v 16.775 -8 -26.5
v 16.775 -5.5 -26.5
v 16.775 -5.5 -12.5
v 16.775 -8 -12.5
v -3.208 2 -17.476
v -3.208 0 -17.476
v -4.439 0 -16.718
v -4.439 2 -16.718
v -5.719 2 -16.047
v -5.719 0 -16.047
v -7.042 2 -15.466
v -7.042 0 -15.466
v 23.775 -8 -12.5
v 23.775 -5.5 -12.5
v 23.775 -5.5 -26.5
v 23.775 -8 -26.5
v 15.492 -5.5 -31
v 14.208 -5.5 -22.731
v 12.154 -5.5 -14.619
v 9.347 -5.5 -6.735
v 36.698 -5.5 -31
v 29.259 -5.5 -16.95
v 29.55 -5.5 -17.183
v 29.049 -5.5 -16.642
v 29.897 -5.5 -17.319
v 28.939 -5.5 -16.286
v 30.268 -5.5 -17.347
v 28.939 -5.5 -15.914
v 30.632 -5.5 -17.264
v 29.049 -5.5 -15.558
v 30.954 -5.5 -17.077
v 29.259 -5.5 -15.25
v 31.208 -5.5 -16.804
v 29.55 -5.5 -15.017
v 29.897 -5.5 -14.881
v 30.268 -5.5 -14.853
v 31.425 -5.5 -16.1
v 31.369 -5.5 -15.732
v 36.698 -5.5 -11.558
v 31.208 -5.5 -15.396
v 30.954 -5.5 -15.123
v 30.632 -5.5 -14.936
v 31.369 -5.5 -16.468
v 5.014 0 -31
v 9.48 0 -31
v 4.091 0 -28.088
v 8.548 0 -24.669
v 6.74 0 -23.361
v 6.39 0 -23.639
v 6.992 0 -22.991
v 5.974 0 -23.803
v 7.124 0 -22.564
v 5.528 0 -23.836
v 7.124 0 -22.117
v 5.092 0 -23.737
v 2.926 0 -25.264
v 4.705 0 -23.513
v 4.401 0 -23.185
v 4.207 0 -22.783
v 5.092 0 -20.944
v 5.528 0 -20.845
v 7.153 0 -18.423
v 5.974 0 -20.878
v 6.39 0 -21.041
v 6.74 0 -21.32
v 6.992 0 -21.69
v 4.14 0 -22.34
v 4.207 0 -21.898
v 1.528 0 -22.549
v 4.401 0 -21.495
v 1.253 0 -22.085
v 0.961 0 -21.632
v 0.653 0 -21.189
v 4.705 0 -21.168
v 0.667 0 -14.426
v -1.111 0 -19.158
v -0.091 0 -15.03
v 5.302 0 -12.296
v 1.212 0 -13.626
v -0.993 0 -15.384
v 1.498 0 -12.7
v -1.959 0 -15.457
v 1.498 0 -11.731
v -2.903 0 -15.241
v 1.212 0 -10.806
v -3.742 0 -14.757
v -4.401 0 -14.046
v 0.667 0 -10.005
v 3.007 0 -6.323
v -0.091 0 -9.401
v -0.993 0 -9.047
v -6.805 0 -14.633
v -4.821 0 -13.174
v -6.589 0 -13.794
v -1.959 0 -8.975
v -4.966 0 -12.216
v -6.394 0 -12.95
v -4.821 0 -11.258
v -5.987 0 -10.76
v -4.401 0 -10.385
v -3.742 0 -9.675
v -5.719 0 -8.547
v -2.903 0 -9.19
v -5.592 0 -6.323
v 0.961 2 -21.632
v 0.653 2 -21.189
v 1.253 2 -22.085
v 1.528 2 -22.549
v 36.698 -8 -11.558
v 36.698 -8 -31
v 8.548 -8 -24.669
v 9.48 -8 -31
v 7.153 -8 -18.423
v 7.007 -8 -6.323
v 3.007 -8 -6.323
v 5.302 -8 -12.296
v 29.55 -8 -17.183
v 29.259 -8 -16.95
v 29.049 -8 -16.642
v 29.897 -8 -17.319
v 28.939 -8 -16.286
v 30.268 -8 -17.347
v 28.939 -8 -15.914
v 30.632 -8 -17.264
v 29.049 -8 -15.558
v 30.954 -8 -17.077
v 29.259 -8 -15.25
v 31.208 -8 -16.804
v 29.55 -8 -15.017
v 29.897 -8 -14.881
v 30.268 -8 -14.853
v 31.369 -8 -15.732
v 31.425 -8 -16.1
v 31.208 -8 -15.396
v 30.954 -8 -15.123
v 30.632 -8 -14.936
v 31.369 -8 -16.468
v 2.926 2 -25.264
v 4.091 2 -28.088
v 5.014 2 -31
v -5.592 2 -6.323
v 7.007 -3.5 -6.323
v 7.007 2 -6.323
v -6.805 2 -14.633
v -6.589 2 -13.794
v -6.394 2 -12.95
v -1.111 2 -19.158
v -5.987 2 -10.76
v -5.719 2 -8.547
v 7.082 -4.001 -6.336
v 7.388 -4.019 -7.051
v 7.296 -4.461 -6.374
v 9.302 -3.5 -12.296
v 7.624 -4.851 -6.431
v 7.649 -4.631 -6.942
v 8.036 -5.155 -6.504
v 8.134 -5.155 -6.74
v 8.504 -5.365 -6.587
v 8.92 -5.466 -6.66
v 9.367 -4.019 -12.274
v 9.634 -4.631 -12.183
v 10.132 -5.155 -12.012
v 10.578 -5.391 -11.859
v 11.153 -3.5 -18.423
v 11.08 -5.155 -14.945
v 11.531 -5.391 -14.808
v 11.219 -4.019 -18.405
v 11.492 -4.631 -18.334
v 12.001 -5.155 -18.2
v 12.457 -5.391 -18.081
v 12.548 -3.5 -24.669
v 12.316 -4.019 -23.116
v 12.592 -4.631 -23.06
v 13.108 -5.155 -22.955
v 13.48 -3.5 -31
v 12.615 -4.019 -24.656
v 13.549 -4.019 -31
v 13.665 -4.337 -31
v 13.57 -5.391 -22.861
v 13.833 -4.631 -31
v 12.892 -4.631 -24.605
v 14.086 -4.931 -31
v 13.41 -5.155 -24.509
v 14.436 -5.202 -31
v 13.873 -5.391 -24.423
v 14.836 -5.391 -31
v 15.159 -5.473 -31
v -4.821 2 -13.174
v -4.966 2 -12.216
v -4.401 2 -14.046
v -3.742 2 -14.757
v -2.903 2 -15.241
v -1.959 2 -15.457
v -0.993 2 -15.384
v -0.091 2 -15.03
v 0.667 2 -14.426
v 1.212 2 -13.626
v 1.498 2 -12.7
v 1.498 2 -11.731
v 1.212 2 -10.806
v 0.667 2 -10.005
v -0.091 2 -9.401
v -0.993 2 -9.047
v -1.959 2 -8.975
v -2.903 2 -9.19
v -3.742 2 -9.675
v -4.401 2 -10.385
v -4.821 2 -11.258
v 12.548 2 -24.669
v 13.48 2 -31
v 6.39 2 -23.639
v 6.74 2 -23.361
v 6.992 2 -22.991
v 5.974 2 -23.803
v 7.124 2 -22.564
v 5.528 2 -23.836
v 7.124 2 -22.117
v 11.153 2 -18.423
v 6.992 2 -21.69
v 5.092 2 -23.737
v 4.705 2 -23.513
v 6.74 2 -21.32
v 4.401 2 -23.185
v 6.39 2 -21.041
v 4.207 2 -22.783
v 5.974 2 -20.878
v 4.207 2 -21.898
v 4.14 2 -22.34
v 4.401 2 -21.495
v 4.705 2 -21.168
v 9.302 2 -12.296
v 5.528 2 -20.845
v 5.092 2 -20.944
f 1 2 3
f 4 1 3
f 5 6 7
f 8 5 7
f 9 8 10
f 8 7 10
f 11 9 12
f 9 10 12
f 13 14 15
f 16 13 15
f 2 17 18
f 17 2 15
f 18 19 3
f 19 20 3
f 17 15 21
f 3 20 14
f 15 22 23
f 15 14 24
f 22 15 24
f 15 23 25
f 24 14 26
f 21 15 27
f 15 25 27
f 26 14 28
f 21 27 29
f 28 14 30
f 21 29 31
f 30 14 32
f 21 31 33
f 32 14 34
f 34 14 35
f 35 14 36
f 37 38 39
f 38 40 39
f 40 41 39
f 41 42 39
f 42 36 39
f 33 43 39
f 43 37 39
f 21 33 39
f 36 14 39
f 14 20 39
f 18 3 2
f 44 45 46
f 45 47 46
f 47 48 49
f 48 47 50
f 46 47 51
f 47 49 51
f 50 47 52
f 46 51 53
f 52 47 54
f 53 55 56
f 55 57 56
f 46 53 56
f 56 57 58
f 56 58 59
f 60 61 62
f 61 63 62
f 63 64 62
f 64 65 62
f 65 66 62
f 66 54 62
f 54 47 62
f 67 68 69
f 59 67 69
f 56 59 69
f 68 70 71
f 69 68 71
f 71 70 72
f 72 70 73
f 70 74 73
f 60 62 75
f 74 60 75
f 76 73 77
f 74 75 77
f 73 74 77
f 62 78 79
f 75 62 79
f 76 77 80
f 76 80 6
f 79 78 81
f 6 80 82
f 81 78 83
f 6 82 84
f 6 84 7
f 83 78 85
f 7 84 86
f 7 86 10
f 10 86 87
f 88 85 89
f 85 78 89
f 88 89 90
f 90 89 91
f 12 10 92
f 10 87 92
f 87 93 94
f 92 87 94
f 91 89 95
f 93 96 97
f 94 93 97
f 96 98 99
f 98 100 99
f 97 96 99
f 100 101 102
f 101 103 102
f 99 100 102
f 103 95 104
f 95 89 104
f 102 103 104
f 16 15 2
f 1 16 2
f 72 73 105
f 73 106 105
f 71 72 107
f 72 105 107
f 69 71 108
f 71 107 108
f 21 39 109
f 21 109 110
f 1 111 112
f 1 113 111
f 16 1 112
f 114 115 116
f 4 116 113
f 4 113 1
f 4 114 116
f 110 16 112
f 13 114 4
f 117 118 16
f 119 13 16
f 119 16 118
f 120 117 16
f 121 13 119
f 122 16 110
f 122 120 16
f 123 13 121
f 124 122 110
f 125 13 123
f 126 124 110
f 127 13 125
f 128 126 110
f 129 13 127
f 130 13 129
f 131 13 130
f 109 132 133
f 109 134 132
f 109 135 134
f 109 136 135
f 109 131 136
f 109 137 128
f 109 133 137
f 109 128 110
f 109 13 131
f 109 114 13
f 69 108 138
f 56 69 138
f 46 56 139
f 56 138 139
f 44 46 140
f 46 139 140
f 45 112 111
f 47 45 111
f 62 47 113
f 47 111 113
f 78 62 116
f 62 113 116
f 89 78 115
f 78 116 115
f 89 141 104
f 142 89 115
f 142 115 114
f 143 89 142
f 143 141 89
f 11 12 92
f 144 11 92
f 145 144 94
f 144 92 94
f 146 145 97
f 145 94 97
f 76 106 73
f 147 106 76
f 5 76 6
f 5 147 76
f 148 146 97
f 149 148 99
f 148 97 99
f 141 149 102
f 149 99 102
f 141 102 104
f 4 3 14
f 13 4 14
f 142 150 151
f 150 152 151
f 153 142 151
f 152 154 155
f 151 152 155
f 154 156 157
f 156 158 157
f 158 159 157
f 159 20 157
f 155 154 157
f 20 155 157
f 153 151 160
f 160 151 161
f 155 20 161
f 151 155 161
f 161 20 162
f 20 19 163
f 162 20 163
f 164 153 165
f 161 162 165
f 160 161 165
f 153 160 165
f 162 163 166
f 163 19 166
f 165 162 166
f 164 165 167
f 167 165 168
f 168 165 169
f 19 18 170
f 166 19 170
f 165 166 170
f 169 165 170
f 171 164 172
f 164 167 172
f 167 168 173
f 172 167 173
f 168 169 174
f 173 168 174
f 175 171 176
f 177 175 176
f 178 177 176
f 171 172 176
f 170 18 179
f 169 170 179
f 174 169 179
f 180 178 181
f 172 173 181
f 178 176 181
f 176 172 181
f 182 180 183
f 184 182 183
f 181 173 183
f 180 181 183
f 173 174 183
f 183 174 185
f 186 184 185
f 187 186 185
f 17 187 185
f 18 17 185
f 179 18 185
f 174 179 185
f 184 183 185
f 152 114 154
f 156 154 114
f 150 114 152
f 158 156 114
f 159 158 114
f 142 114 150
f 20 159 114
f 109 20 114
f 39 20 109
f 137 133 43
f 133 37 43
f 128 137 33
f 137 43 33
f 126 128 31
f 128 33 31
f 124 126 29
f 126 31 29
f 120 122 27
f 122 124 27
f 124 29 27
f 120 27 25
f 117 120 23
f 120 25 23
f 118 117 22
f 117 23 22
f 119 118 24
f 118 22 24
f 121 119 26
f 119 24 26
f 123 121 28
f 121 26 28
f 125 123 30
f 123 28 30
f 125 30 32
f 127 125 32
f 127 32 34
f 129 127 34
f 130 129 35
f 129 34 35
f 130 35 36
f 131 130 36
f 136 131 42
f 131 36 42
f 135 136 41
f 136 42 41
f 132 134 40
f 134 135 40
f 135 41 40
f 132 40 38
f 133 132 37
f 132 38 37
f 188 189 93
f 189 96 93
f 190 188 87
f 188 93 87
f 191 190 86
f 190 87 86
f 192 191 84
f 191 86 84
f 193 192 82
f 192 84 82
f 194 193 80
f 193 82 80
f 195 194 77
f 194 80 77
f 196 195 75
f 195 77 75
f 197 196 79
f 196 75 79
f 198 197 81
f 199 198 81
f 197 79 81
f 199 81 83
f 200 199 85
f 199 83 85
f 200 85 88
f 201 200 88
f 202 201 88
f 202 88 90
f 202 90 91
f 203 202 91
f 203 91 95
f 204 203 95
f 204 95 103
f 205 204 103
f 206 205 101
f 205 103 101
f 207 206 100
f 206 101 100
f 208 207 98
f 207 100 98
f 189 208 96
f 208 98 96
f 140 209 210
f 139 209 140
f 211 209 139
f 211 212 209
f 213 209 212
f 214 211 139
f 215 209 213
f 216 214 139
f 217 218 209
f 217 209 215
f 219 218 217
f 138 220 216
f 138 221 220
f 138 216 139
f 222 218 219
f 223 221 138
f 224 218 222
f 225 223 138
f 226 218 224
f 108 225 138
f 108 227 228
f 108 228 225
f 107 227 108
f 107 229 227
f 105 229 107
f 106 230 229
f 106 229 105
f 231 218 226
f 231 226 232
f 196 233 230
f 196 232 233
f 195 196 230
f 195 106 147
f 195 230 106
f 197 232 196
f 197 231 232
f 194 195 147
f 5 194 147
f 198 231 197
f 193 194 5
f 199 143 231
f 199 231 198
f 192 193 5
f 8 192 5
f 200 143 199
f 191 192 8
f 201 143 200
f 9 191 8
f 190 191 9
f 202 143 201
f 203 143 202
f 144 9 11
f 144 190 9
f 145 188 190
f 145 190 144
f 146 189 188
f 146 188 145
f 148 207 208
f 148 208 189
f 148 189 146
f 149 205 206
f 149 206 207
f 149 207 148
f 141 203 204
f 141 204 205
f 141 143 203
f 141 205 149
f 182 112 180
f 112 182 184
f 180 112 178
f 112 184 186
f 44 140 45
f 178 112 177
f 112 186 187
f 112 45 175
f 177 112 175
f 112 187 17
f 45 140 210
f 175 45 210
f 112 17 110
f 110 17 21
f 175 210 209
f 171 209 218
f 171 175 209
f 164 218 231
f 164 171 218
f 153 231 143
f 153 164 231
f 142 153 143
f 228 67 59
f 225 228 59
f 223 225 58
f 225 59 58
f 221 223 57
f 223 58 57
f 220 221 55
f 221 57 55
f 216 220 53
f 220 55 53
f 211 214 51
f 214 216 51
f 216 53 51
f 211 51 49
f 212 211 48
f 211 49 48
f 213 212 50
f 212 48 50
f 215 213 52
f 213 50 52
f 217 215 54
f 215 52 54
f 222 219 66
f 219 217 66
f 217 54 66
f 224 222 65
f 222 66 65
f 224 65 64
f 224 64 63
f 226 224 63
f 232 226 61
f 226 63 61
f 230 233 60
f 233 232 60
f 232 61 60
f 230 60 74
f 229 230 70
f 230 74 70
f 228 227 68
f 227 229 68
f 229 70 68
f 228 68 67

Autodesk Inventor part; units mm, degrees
ref_plane "YZ Plane" through (0, 0, 0) normal (1, 0, 0) x (0, 1, 0)
ref_plane "XZ Plane" through (0, 0, 0) normal (0, 1, 0) x (-1, 0, 0)
ref_plane "XY Plane" through (0, 0, 0) normal (0, 0, 1) x (1, 0, 0)
sketch "Sketch1" plane through (0, 0, 0) normal (0, 1, 0) x (-1, 0, 0)
  line L0 (0, 0) -> (60, 0)
  line L1 (60, 0) -> (60, -81)
  line L2 (60, -81) -> (0, -81)
  line L3 (0, -81) -> (0, 0)
  line L4 (45, -21.6284) -> (15, -21.6284) construction
  line L5 (45, -81) -> (45, 0) construction
  line L6 (15, 0) -> (15, -81) construction
  circle A0 centre (40, -73.5) radius 1.5
  circle A1 centre (40, -7.5) radius 1.5
  circle A2 centre (20, -7.5) radius 1.5
  circle A3 centre (20, -73.5) radius 1.5
  line L7 (60, -40.5) -> (0, -40.5) construction
  line L8 (30, 0) -> (30, -81) construction
  circle A4 centre (30, -40.5) radius 24
  circle A5 centre (30, -40.5) radius 27.5
  circle A6 centre (57.1293, -36) radius 1.5
  circle A7 centre (57.1293, -45) radius 1.5
  circle A8 centre (25.5, -13.3707) radius 1.5
  circle A9 centre (34.5, -13.3707) radius 1.5
  circle A10 centre (2.8707, -45) radius 1.5
  circle A11 centre (2.8707, -36) radius 1.5
  circle A12 centre (34.5, -67.6293) radius 1.5
  circle A13 centre (25.5, -67.6293) radius 1.5
  circle A14 centre (30, -40.5) radius 40 construction
  arc A15 (60, -81) -> (60, 0) centre (-17.0125, -40.5) ccw
  circle A16 centre (30, -40.5) radius 36.28 construction
  circle A17 centre (65.9998, -36) radius 1.5
  circle A18 centre (65.9998, -45) radius 1.5
  circle A19 centre (-5.9998, -45) radius 1.5
  circle A20 centre (-5.9998, -36) radius 1.5
  arc A21 (0, 0) -> (0, -81) centre (77.0125, -40.5) ccw
  line L9 (30, -40.5) -> (-3.3536, -73.8536) construction
  circle A22 centre (1.7157, -68.7843) radius 1.5
  circle A23 centre (11.8404, -76.1403) radius 1.5
  circle A24 centre (23.7426, -80.0075) radius 1.5
  circle A25 centre (36.2574, -80.0075) radius 1.5
  circle A26 centre (48.1596, -76.1403) radius 1.5
  circle A27 centre (58.2843, -68.7843) radius 1.5
  circle A28 centre (65.6403, -58.6596) radius 1.5
  circle A29 centre (69.5075, -46.7574) radius 1.5
  circle A30 centre (69.5075, -34.2426) radius 1.5
  circle A31 centre (65.6403, -22.3404) radius 1.5
  circle A32 centre (58.2843, -12.2157) radius 1.5
  circle A33 centre (48.1596, -4.8597) radius 1.5
  circle A34 centre (36.2574, -0.9925) radius 1.5
  circle A35 centre (23.7426, -0.9925) radius 1.5
  circle A36 centre (11.8404, -4.8597) radius 1.5
  circle A37 centre (1.7157, -12.2157) radius 1.5
  circle A38 centre (-5.6403, -22.3404) radius 1.5
  circle A39 centre (-9.5075, -34.2426) radius 1.5
  circle A40 centre (-9.5075, -46.7574) radius 1.5
  circle A41 centre (-5.6403, -58.6596) radius 1.5
  circle A42 centre (48.1596, -68.7843) radius 1.5
  circle A43 centre (48.1596, -12.2157) radius 1.5
  circle A44 centre (11.8404, -12.2157) radius 1.5
  circle A45 centre (11.8404, -68.7843) radius 1.5
  line L10 (0, 0) -> (6, 0)
  arc A46 (6, 0) -> (6.3936, -12.9505) centre (40.8143, -5.423) ccw
  arc A47 (6.3936, -12.9505) -> (-5.0141, -31) centre (30, -40.5) ccw
  line L11 (-9.4798, -31) -> (7.9603, -31)
  line L12 (-10, -40.5) -> (70, -40.5) construction
  line L13 (-18.775, -14.5) -> (-31.775, -14.5)
  line L14 (-31.775, -14.5) -> (-31.775, -24.5)
  line L15 (-31.775, -24.5) -> (-18.775, -24.5)
  line L16 (-18.775, -24.5) -> (-18.775, -14.5)
  line L17 (-18.775, -54.5) -> (-37.775, -54.5)
  line L18 (-37.775, -54.5) -> (-37.775, -68.5)
  line L19 (-37.775, -68.5) -> (-18.775, -68.5)
  line L20 (-18.775, -68.5) -> (-18.775, -54.5)
  line L21 (-17.0125, -40.5) -> (-69.0232, -40.5)
  line L22 (-16.775, -12.5) -> (-23.775, -12.5)
  line L23 (-23.775, -12.5) -> (-23.775, -26.5)
  line L24 (-23.775, -26.5) -> (-16.775, -26.5)
  line L25 (-16.775, -26.5) -> (-16.775, -12.5)
  line L26 (-16.775, -52.5) -> (-23.775, -52.5)
  line L27 (-23.775, -52.5) -> (-23.775, -70.5)
  line L28 (-23.775, -70.5) -> (-16.775, -70.5)
  line L29 (-16.775, -70.5) -> (-16.775, -52.5)
  circle A48 centre (-30.175, -16.1) radius 1.25
  circle A49 centre (-30.175, -22.9) radius 1.25
  circle A50 centre (-35.775, -56.5) radius 1.25
  line L30 (-16.775, -32.5) -> (-49.775, -32.5)
  line L31 (-51.775, -34.5) -> (-51.775, -46.5)
  line L32 (-49.775, -48.5) -> (-16.775, -48.5)
  line L33 (-16.775, -48.5) -> (-16.775, -32.5)
  line L34 (-16.775, -43.5) -> (-38.775, -43.5) construction
  line L35 (-32.0174, -32.5) -> (-46.0174, -32.5)
  line L36 (-46.0174, -32.5) -> (-46.0174, -48.5)
  line L37 (-46.0174, -48.5) -> (-32.0174, -48.5)
  line L38 (-32.0174, -48.5) -> (-32.0174, -32.5)
  line L39 (0, 0) -> (-59.1614, -10.4318)
  line L40 (0, -81) -> (-59.1614, -70.5682)
  arc A51 (-51.775, -9.1293) -> (-51.775, -71.8707) centre (29.3856, -40.5) ccw
  arc A52 (-49.775, -32.5) -> (-51.775, -34.5) centre (-49.775, -34.5) ccw
  arc A53 (-51.775, -46.5) -> (-49.775, -48.5) centre (-49.775, -46.5) ccw
  arc A54 (6.3936, -68.0495) -> (6, -81) centre (40.8143, -75.577) ccw
  arc A55 (-5.0141, -50) -> (6.3936, -68.0495) centre (30, -40.5) ccw
  line L41 (-9.4798, -50) -> (7.9603, -50)
  arc A56 (-4.4033, -0.7764) -> (-4.4033, -80.2236) centre (73.0125, -40.5) ccw
  circle A57 centre (1.7157, -12.2157) radius 3.25
  circle A58 centre (1.7157, -68.7843) radius 3.25
  arc A59 (6.3936, -12.9505) -> (7.0417, -15.4657) centre (40.8143, -5.423) ccw
  arc A60 (7.0417, -15.4657) -> (0, -20.0981) centre (14.8139, -34.9486) ccw
  arc A61 (7.0417, -65.5343) -> (6.3936, -68.0495) centre (40.8143, -75.577) ccw
  arc A62 (0, -60.9019) -> (7.0417, -65.5343) centre (14.8139, -46.0514) ccw
  point P0 (30, -21.6284)
  point P1 (-18.775, -19.5)
  point P2 (-18.775, -61.5)
  point P3 (-51.775, -48.5)
  point P4 (-51.775, -32.5)
  point P5 (-16.775, -40.5)
  point P6 (-16.775, -61.5)
  point P7 (-51.775, -40.5)
  point P8 (-14, -40.5)
  point P9 (6, -81)
  point P10 (0, -60.9019)
  dimension "d18" = 48
  dimension "d6" = 60
  dimension "d7" = 81
  dimension "d8" = 3
  dimension "d9" = 7.5
  dimension "d10" = 5
  dimension "d11" = 30
  dimension "d12" = 3
  dimension "d13" = 7.5
  dimension "d14" = 5
  dimension "d15" = 3
  dimension "d16" = 3
  dimension "d17" = 5
  dimension "d19" = 55
  dimension "d20" = 3
  dimension "d21" = 4.5
  dimension "d22" = 3
  dimension "d23" = 4.5
  dimension "d24" = 360
  dimension "d25" = 80
  dimension "d26" = 72.56
  dimension "d27" = 3
  dimension "d28" = 3
  dimension "d29" = 360
  dimension "d30" = 45
  dimension "d31" = 3
  dimension "d32" = 360
  dimension "d33" = 3
  dimension "d34" = 3
  dimension "d35" = 3
  dimension "d36" = 3
  dimension "d37" = 6
  dimension "d38" = 5
  dimension "d39" = 30
  dimension "d40" = 40.5
  dimension "d41" = 13
  dimension "d42" = 10
  dimension "d43" = 19
  dimension "d44" = 14
  dimension "d45" = 7
  dimension "d46" = 2
  dimension "d47" = 2
  dimension "d48" = 2
  dimension "d49" = 2
  dimension "d50" = 2
  dimension "d51" = 2
  dimension "d52" = 7
  dimension "d53" = 2.5
  dimension "d54" = 2.5
  dimension "d55" = 1.6
  dimension "d56" = 1.6
  dimension "d57" = 2.5
  dimension "d58" = 2
  dimension "d59" = 2
  dimension "d60" = 35
  dimension "d61" = 16
  dimension "d62" = 4
  dimension "d63" = 6
  dimension "d64" = 22
  dimension "d65" = 14
  dimension "d66" = 80
  dimension "d67" = 80
  dimension "d68" = 2
  dimension "d69" = 4
  dimension "d78" = 6.5
extrude "Extrusion1" add sketch "Sketch1" along normal blind 2 contours L0 A46 A47 L3 A57 | L3 A57 A47 L11 A21 | A21 A39 A40 L40 A56 L39 | A59 A60 A47 | A21 A39 | L3 A58 A55 A54 L2 | A21 L41 A55 L3 A58 | A21 A40 | A62 A61 A55 picked at (-10.1825, -34.1938) picked at (-10.1825, -46.8062)
extrude "Extrusion2" add sketch "Sketch1" against normal blind 4 contours A21 A39 A40 L40 A56 L39 | A21 A39 | A21 A40 picked at (-10.1825, -34.1938) picked at (-10.1825, -46.8062)
ref_plane "Work Plane1" through (0, -5.5, 0) normal (0, -1, 0) x (1, 0, 0)
sketch "Sketch2" plane through (0, -5.5, 0) normal (0, -1, 0) x (1, 0, 0)
  line L0 (0, -81) -> (59.1614, -70.5682) projected
  arc A0 (51.775, -71.8707) -> (51.775, -9.1293) centre (-29.3856, -40.5) ccw projected
  line L1 (49.775, -48.5) -> (16.775, -48.5) projected
  arc A1 (49.775, -48.5) -> (51.775, -46.5) centre (49.775, -46.5) ccw projected
  line L2 (51.775, -34.5) -> (51.775, -46.5) projected
  arc A2 (51.775, -34.5) -> (49.775, -32.5) centre (49.775, -34.5) ccw projected
  line L3 (16.775, -32.5) -> (49.775, -32.5) projected
  line L4 (46.0174, -32.5) -> (46.0174, -48.5) projected
  line L5 (32.0174, -48.5) -> (32.0174, -32.5) projected
  line L6 (16.775, -48.5) -> (16.775, -32.5) projected
  arc A3 (4.4033, -80.2236) -> (4.4033, -0.7764) centre (-73.0125, -40.5) ccw projected
  arc A4 (0, -81) -> (0, 0) centre (-77.0125, -40.5) ccw projected
  line L7 (37.775, -68.5) -> (18.775, -68.5) projected
  line L8 (37.775, -54.5) -> (37.775, -68.5) projected
  line L9 (18.775, -54.5) -> (37.775, -54.5) projected
  circle A5 centre (35.775, -56.5) radius 1.25 projected
  line L10 (23.775, -52.5) -> (23.775, -70.5) projected
  line L11 (23.775, -70.5) -> (16.775, -70.5) projected
  line L12 (16.775, -70.5) -> (16.775, -52.5) projected
  line L13 (18.775, -68.5) -> (18.775, -54.5) projected
  line L14 (16.775, -52.5) -> (23.775, -52.5) projected
  line L15 (31.775, -24.5) -> (18.775, -24.5) projected
  line L16 (31.775, -14.5) -> (31.775, -24.5) projected
  circle A6 centre (30.175, -16.1) radius 1.25 projected
  line L17 (18.775, -14.5) -> (31.775, -14.5) projected
  line L18 (0, 0) -> (59.1614, -10.4318) projected
  line L19 (23.775, -12.5) -> (23.775, -26.5) projected
  line L20 (16.775, -12.5) -> (23.775, -12.5) projected
  line L21 (16.775, -26.5) -> (16.775, -12.5) projected
  line L22 (18.775, -24.5) -> (18.775, -14.5) projected
  line L23 (23.775, -26.5) -> (16.775, -26.5) projected
  line L24 (17.0125, -40.5) -> (69.0232, -40.5) projected
  point P0 (23.775, -24.5)
  point P1 (23.775, -14.5)
  point P2 (23.775, -68.5)
  point P3 (23.775, -54.5)
extrude "Extrusion3" add sketch "Sketch2" along normal blind 2.5 contours A4 L18 A3 L0 | L2 A1 L1 L4 L24 | L24 L4 L3 A2 L2 | A3 L18 A0 L0 | L5 L1 L6 L3 | L7 L10 L9 L8 | L15 L19 L17 L16
extrude "Extrusion4" add sketch "Sketch2" against normal up to surface (1.5 mm away) contours A4 L18 A3 L0
fillet "Fillet1" radius 2 3 edges at (46.0174, -6.75, -32.5) (46.0174, -6.75, -48.5) (14, -5.5, -40.5)
fillet "Fillet2" radius 15 2 edges at (0, 1, -20.0981) (0, 1, -60.9019)
sketch "Sketch3" plane through (0, 2, 0) normal (0, 1, 0) x (1, 0, 0)
  arc A0 (-6, 0) -> (-7.0417, 15.4657) centre (-40.8143, 5.423) ccw projected
  line L0 (-5.5916, 6.3226) -> (7.0067, 6.3226)
  arc A1 (4.4033, 0.7764) -> (4.4033, 80.2236) centre (-73.0125, 40.5) ccw projected
  line L1 (7.0067, 6.3226) -> (36.6975, 11.5578)
  arc A2 (51.775, 9.1293) -> (51.775, 71.8707) centre (-29.3856, 40.5) ccw projected
  line L2 (51.775, 9.1293) -> (6.8591, 1.2095) projected
  line L3 (36.6975, 11.5578) -> (36.6975, 31)
  line L4 (9.4798, 31) -> (5.0141, 31) projected
  line L5 (5.0141, 31) -> (36.6975, 31)
  arc A3 (1.5276, 22.5487) -> (5.0141, 31) centre (-30, 40.5) ccw projected
  arc A4 (-3.2083, 17.4758) -> (1.5276, 22.5487) centre (-11.5075, 29.9707) ccw projected
  arc A5 (-7.0417, 15.4657) -> (-3.2083, 17.4758) centre (-14.8139, 34.9486) ccw projected
  line L6 (-14.8139, 83.8993) -> (60.693, 83.8993)
  line L7 (60.693, 83.8993) -> (60.693, -4.0621)
  line L8 (60.693, -4.0621) -> (-14.8139, -4.0621)
  line L9 (-14.8139, -4.0621) -> (-14.8139, 83.8993)
  point P0 (0, 0)
extrude "Extrusion5" cut sketch "Sketch3" against normal up to surface (10 mm away)
equation "\"d11\" = 0.5 * d6"
equation "\"d12\" = d8"
equation "\"d15\" = d8"
equation "\"d16\" = d8"
equation "\"d22\" = d8"
equation "\"d27\" = d8"
equation "\"d28\" = d8"
equation "\"d31\" = d8"
equation "\"d33\" = d8"
equation "\"d34\" = d8"
equation "\"d35\" = d8"
equation "\"d36\" = d8"
properties part number "SensorHolderSmall"
